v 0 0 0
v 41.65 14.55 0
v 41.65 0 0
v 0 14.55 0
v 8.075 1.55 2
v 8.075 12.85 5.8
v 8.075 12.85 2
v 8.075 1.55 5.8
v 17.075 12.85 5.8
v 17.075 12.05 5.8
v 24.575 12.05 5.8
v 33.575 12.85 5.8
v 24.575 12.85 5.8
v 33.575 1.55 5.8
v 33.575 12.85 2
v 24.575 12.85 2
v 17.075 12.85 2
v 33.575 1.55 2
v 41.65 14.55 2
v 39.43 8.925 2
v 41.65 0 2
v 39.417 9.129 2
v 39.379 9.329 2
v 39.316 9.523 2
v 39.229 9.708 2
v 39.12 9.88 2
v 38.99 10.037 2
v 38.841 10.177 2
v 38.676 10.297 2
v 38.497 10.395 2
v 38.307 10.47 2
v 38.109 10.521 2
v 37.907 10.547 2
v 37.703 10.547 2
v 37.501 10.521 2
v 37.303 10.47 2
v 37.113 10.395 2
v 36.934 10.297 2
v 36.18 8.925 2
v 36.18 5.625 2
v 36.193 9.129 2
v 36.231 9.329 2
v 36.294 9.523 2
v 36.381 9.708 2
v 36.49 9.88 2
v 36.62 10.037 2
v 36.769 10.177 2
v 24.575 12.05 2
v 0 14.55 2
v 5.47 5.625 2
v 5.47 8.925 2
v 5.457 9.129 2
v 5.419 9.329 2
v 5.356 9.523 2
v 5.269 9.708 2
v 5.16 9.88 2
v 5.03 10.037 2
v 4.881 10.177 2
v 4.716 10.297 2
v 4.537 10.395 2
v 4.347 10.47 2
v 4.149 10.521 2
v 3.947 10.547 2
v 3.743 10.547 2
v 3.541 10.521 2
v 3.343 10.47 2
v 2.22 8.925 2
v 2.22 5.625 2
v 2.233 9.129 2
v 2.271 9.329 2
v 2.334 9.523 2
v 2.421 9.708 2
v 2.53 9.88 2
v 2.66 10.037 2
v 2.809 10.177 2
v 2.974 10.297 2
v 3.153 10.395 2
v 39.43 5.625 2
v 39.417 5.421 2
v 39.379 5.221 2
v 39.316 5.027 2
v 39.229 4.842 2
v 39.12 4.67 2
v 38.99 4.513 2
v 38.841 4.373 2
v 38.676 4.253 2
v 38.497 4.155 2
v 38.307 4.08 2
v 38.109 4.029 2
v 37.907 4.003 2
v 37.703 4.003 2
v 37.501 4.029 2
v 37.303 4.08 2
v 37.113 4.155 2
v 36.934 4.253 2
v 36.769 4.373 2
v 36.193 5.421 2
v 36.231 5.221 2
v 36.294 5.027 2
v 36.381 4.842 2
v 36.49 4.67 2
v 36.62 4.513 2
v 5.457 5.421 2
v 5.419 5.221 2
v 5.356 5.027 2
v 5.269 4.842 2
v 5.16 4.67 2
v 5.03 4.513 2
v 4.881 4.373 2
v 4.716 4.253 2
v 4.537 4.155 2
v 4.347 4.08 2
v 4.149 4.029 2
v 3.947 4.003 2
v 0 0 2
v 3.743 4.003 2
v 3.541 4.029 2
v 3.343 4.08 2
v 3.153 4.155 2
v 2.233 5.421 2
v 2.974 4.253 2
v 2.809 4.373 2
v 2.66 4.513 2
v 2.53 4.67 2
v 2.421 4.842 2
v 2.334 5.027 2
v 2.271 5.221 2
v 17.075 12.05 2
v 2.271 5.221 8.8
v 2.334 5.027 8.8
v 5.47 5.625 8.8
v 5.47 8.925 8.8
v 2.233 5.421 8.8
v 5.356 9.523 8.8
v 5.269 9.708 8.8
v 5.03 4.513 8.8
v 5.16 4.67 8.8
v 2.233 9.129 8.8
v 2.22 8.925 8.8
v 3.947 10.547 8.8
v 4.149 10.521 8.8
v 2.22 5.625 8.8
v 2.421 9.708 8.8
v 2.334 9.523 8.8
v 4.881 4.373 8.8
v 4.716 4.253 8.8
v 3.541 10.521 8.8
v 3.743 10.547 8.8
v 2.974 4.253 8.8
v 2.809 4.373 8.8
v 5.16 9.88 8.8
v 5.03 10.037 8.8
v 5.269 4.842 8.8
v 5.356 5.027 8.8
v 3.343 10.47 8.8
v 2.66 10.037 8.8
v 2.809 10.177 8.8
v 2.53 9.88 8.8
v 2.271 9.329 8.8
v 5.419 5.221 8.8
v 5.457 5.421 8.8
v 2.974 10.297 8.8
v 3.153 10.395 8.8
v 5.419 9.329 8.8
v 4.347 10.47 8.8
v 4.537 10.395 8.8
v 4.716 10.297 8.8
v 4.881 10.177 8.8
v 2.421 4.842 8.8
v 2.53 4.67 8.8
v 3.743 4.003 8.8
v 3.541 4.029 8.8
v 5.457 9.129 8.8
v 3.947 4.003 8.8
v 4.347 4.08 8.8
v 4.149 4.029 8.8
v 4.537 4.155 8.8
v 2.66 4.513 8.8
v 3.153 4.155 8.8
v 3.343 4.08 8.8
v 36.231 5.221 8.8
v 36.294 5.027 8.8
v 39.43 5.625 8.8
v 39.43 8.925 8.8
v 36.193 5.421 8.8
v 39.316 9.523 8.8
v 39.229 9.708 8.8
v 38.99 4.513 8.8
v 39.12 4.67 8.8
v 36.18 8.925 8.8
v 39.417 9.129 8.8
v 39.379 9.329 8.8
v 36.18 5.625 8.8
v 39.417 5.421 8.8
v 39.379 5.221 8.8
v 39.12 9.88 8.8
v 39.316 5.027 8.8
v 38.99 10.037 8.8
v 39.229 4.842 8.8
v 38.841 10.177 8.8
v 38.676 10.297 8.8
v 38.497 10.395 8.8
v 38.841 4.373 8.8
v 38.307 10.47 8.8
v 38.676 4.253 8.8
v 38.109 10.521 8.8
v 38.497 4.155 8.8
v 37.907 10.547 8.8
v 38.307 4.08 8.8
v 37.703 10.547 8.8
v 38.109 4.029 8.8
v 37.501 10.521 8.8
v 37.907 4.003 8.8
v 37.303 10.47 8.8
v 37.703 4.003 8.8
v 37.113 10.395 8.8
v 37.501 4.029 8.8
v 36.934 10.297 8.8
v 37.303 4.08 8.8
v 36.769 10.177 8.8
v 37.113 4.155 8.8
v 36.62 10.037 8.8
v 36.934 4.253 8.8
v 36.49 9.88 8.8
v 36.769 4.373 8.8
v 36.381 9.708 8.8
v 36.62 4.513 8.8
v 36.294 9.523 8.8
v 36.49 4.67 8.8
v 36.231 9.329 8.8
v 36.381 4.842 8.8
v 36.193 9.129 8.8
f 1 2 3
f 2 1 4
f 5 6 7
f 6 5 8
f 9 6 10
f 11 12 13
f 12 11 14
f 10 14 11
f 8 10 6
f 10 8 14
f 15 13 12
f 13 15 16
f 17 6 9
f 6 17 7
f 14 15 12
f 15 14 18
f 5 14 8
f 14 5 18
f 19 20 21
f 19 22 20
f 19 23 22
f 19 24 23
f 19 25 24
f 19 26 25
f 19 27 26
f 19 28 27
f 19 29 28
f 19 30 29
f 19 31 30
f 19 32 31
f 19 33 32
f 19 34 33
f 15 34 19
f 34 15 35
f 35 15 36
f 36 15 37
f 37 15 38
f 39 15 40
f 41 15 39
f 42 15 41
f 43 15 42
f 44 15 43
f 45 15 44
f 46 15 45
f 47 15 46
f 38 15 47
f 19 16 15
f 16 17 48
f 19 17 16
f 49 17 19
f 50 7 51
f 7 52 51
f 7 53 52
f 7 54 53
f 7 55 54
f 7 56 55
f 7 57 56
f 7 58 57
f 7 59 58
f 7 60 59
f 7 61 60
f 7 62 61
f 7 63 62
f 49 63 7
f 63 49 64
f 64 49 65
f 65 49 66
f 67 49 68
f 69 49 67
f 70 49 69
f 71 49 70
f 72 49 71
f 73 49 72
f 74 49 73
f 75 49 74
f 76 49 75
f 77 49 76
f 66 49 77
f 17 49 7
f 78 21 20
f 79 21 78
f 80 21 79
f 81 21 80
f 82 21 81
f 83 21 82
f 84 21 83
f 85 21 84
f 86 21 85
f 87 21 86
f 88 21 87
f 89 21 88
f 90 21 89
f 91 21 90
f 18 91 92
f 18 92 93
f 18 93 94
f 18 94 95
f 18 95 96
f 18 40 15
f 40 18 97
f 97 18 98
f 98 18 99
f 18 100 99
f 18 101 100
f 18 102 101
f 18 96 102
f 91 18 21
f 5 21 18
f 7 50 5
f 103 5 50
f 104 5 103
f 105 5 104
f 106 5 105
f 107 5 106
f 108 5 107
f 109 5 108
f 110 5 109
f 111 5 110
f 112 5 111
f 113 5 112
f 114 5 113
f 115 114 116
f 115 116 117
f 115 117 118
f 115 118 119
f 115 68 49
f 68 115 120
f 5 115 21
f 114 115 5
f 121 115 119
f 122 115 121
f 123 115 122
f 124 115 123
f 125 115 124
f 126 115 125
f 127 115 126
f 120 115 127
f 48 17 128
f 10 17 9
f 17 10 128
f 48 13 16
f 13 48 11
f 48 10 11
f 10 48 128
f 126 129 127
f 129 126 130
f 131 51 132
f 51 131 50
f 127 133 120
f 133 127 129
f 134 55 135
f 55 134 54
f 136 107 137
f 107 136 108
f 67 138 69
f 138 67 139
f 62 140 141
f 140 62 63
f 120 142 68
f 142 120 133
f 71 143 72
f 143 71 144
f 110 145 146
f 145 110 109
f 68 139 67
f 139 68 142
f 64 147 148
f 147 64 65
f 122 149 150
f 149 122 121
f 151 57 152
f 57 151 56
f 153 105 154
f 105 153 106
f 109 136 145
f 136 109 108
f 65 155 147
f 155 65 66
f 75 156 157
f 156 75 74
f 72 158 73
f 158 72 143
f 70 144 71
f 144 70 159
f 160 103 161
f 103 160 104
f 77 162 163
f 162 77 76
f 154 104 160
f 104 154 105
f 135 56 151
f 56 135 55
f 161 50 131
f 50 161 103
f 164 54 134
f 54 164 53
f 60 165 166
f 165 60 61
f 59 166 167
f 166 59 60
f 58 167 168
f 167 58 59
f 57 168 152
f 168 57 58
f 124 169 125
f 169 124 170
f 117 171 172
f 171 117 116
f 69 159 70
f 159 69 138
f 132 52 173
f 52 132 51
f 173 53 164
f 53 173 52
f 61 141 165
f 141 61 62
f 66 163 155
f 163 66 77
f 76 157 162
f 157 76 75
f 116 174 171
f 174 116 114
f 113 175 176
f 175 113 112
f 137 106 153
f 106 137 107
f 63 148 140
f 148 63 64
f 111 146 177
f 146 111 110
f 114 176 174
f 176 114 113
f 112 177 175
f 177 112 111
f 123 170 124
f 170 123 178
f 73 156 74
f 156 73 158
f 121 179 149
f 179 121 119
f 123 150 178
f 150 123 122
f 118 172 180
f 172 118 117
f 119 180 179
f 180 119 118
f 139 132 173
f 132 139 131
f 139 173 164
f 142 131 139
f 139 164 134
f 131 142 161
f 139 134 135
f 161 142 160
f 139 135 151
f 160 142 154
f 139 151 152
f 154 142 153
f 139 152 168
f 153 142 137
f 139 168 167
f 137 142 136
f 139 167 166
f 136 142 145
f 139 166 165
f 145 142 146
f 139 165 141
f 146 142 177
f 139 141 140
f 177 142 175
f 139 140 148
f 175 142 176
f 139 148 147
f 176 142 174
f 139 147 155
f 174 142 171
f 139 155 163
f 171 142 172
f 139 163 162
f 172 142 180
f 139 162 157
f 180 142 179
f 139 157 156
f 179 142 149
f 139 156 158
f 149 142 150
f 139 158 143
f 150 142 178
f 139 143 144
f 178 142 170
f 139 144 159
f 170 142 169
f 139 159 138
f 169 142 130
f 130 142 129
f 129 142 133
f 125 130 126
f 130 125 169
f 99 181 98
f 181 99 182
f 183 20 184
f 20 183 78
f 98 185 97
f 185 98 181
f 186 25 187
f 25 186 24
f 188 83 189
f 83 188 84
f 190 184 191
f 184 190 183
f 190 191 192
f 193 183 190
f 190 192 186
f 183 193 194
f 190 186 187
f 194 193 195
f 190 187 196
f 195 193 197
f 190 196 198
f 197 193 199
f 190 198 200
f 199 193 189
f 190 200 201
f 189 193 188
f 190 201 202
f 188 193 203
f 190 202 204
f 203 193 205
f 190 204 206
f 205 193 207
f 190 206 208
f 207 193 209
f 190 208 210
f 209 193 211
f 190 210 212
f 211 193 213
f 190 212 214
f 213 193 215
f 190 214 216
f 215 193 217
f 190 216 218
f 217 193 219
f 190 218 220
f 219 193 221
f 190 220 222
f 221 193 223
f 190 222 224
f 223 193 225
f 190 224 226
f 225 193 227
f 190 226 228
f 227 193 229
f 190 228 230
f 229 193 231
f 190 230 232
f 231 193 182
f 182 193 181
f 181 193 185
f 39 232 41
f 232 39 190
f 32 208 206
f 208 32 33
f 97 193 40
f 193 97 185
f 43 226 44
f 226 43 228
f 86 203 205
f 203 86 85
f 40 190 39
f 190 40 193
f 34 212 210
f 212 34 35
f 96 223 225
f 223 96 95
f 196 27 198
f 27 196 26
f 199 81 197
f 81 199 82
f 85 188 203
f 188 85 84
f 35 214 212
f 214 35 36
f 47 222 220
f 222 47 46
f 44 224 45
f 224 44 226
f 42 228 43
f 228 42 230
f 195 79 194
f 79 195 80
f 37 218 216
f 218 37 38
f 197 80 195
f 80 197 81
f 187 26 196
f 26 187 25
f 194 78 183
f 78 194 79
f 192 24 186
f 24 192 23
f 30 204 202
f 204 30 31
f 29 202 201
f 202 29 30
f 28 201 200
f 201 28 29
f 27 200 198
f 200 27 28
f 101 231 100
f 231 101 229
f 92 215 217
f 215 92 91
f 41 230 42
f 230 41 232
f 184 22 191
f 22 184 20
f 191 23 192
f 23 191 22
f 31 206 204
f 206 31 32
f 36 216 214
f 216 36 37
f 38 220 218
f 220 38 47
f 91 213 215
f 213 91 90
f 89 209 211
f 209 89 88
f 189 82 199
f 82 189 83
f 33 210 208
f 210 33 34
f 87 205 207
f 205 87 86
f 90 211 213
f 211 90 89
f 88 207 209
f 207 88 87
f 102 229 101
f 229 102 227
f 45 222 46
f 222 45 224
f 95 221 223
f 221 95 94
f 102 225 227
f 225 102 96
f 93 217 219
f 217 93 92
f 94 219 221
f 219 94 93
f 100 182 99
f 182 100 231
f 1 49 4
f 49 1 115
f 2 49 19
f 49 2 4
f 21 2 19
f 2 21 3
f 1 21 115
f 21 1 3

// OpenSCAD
$fn=50;

eps = .1;

baseD = [41.65, 14.55];
baseH = 2;
innerHolderD = [25.5, 11.3];
innerHolderH = 3.8;
innerHolderChampferD = [7.5,0.9];
sideHolderD = [3.25, 6.55-3.25];


linear_extrude(baseH) square(baseD);

translate([(baseD.x-innerHolderD.x)/2,1.55,0]) {
    difference() {
        linear_extrude(baseH+innerHolderH) square(innerHolderD);
        translate([(innerHolderD.x-innerHolderChampferD.x)/2, innerHolderD.y-innerHolderChampferD.y+eps, baseH]) 
            linear_extrude(innerHolderH+eps)
                square(innerHolderChampferD);
    }
}

translate([0,baseD.y/2,0]) {
    translate([2.22+sideHolderD.x/2,0,0]) sideHolder(sideHolderD, innerHolderH+3);
    translate([baseD.x - 2.22 - sideHolderD.x/2,0,0]) sideHolder(sideHolderD, innerHolderH+3);
}

module sideHolder(sideHolderD, sideHolderH) {    
    translate([-sideHolderD.x/2,-sideHolderD.y/2,0]) linear_extrude(baseH+sideHolderH) {
       square(sideHolderD);
        translate([sideHolderD.x/2,0,0]) {
            circle(d=sideHolderD.x);
            translate([0,sideHolderD.y,0]) circle(d=sideHolderD.x);
        }
    }
}
